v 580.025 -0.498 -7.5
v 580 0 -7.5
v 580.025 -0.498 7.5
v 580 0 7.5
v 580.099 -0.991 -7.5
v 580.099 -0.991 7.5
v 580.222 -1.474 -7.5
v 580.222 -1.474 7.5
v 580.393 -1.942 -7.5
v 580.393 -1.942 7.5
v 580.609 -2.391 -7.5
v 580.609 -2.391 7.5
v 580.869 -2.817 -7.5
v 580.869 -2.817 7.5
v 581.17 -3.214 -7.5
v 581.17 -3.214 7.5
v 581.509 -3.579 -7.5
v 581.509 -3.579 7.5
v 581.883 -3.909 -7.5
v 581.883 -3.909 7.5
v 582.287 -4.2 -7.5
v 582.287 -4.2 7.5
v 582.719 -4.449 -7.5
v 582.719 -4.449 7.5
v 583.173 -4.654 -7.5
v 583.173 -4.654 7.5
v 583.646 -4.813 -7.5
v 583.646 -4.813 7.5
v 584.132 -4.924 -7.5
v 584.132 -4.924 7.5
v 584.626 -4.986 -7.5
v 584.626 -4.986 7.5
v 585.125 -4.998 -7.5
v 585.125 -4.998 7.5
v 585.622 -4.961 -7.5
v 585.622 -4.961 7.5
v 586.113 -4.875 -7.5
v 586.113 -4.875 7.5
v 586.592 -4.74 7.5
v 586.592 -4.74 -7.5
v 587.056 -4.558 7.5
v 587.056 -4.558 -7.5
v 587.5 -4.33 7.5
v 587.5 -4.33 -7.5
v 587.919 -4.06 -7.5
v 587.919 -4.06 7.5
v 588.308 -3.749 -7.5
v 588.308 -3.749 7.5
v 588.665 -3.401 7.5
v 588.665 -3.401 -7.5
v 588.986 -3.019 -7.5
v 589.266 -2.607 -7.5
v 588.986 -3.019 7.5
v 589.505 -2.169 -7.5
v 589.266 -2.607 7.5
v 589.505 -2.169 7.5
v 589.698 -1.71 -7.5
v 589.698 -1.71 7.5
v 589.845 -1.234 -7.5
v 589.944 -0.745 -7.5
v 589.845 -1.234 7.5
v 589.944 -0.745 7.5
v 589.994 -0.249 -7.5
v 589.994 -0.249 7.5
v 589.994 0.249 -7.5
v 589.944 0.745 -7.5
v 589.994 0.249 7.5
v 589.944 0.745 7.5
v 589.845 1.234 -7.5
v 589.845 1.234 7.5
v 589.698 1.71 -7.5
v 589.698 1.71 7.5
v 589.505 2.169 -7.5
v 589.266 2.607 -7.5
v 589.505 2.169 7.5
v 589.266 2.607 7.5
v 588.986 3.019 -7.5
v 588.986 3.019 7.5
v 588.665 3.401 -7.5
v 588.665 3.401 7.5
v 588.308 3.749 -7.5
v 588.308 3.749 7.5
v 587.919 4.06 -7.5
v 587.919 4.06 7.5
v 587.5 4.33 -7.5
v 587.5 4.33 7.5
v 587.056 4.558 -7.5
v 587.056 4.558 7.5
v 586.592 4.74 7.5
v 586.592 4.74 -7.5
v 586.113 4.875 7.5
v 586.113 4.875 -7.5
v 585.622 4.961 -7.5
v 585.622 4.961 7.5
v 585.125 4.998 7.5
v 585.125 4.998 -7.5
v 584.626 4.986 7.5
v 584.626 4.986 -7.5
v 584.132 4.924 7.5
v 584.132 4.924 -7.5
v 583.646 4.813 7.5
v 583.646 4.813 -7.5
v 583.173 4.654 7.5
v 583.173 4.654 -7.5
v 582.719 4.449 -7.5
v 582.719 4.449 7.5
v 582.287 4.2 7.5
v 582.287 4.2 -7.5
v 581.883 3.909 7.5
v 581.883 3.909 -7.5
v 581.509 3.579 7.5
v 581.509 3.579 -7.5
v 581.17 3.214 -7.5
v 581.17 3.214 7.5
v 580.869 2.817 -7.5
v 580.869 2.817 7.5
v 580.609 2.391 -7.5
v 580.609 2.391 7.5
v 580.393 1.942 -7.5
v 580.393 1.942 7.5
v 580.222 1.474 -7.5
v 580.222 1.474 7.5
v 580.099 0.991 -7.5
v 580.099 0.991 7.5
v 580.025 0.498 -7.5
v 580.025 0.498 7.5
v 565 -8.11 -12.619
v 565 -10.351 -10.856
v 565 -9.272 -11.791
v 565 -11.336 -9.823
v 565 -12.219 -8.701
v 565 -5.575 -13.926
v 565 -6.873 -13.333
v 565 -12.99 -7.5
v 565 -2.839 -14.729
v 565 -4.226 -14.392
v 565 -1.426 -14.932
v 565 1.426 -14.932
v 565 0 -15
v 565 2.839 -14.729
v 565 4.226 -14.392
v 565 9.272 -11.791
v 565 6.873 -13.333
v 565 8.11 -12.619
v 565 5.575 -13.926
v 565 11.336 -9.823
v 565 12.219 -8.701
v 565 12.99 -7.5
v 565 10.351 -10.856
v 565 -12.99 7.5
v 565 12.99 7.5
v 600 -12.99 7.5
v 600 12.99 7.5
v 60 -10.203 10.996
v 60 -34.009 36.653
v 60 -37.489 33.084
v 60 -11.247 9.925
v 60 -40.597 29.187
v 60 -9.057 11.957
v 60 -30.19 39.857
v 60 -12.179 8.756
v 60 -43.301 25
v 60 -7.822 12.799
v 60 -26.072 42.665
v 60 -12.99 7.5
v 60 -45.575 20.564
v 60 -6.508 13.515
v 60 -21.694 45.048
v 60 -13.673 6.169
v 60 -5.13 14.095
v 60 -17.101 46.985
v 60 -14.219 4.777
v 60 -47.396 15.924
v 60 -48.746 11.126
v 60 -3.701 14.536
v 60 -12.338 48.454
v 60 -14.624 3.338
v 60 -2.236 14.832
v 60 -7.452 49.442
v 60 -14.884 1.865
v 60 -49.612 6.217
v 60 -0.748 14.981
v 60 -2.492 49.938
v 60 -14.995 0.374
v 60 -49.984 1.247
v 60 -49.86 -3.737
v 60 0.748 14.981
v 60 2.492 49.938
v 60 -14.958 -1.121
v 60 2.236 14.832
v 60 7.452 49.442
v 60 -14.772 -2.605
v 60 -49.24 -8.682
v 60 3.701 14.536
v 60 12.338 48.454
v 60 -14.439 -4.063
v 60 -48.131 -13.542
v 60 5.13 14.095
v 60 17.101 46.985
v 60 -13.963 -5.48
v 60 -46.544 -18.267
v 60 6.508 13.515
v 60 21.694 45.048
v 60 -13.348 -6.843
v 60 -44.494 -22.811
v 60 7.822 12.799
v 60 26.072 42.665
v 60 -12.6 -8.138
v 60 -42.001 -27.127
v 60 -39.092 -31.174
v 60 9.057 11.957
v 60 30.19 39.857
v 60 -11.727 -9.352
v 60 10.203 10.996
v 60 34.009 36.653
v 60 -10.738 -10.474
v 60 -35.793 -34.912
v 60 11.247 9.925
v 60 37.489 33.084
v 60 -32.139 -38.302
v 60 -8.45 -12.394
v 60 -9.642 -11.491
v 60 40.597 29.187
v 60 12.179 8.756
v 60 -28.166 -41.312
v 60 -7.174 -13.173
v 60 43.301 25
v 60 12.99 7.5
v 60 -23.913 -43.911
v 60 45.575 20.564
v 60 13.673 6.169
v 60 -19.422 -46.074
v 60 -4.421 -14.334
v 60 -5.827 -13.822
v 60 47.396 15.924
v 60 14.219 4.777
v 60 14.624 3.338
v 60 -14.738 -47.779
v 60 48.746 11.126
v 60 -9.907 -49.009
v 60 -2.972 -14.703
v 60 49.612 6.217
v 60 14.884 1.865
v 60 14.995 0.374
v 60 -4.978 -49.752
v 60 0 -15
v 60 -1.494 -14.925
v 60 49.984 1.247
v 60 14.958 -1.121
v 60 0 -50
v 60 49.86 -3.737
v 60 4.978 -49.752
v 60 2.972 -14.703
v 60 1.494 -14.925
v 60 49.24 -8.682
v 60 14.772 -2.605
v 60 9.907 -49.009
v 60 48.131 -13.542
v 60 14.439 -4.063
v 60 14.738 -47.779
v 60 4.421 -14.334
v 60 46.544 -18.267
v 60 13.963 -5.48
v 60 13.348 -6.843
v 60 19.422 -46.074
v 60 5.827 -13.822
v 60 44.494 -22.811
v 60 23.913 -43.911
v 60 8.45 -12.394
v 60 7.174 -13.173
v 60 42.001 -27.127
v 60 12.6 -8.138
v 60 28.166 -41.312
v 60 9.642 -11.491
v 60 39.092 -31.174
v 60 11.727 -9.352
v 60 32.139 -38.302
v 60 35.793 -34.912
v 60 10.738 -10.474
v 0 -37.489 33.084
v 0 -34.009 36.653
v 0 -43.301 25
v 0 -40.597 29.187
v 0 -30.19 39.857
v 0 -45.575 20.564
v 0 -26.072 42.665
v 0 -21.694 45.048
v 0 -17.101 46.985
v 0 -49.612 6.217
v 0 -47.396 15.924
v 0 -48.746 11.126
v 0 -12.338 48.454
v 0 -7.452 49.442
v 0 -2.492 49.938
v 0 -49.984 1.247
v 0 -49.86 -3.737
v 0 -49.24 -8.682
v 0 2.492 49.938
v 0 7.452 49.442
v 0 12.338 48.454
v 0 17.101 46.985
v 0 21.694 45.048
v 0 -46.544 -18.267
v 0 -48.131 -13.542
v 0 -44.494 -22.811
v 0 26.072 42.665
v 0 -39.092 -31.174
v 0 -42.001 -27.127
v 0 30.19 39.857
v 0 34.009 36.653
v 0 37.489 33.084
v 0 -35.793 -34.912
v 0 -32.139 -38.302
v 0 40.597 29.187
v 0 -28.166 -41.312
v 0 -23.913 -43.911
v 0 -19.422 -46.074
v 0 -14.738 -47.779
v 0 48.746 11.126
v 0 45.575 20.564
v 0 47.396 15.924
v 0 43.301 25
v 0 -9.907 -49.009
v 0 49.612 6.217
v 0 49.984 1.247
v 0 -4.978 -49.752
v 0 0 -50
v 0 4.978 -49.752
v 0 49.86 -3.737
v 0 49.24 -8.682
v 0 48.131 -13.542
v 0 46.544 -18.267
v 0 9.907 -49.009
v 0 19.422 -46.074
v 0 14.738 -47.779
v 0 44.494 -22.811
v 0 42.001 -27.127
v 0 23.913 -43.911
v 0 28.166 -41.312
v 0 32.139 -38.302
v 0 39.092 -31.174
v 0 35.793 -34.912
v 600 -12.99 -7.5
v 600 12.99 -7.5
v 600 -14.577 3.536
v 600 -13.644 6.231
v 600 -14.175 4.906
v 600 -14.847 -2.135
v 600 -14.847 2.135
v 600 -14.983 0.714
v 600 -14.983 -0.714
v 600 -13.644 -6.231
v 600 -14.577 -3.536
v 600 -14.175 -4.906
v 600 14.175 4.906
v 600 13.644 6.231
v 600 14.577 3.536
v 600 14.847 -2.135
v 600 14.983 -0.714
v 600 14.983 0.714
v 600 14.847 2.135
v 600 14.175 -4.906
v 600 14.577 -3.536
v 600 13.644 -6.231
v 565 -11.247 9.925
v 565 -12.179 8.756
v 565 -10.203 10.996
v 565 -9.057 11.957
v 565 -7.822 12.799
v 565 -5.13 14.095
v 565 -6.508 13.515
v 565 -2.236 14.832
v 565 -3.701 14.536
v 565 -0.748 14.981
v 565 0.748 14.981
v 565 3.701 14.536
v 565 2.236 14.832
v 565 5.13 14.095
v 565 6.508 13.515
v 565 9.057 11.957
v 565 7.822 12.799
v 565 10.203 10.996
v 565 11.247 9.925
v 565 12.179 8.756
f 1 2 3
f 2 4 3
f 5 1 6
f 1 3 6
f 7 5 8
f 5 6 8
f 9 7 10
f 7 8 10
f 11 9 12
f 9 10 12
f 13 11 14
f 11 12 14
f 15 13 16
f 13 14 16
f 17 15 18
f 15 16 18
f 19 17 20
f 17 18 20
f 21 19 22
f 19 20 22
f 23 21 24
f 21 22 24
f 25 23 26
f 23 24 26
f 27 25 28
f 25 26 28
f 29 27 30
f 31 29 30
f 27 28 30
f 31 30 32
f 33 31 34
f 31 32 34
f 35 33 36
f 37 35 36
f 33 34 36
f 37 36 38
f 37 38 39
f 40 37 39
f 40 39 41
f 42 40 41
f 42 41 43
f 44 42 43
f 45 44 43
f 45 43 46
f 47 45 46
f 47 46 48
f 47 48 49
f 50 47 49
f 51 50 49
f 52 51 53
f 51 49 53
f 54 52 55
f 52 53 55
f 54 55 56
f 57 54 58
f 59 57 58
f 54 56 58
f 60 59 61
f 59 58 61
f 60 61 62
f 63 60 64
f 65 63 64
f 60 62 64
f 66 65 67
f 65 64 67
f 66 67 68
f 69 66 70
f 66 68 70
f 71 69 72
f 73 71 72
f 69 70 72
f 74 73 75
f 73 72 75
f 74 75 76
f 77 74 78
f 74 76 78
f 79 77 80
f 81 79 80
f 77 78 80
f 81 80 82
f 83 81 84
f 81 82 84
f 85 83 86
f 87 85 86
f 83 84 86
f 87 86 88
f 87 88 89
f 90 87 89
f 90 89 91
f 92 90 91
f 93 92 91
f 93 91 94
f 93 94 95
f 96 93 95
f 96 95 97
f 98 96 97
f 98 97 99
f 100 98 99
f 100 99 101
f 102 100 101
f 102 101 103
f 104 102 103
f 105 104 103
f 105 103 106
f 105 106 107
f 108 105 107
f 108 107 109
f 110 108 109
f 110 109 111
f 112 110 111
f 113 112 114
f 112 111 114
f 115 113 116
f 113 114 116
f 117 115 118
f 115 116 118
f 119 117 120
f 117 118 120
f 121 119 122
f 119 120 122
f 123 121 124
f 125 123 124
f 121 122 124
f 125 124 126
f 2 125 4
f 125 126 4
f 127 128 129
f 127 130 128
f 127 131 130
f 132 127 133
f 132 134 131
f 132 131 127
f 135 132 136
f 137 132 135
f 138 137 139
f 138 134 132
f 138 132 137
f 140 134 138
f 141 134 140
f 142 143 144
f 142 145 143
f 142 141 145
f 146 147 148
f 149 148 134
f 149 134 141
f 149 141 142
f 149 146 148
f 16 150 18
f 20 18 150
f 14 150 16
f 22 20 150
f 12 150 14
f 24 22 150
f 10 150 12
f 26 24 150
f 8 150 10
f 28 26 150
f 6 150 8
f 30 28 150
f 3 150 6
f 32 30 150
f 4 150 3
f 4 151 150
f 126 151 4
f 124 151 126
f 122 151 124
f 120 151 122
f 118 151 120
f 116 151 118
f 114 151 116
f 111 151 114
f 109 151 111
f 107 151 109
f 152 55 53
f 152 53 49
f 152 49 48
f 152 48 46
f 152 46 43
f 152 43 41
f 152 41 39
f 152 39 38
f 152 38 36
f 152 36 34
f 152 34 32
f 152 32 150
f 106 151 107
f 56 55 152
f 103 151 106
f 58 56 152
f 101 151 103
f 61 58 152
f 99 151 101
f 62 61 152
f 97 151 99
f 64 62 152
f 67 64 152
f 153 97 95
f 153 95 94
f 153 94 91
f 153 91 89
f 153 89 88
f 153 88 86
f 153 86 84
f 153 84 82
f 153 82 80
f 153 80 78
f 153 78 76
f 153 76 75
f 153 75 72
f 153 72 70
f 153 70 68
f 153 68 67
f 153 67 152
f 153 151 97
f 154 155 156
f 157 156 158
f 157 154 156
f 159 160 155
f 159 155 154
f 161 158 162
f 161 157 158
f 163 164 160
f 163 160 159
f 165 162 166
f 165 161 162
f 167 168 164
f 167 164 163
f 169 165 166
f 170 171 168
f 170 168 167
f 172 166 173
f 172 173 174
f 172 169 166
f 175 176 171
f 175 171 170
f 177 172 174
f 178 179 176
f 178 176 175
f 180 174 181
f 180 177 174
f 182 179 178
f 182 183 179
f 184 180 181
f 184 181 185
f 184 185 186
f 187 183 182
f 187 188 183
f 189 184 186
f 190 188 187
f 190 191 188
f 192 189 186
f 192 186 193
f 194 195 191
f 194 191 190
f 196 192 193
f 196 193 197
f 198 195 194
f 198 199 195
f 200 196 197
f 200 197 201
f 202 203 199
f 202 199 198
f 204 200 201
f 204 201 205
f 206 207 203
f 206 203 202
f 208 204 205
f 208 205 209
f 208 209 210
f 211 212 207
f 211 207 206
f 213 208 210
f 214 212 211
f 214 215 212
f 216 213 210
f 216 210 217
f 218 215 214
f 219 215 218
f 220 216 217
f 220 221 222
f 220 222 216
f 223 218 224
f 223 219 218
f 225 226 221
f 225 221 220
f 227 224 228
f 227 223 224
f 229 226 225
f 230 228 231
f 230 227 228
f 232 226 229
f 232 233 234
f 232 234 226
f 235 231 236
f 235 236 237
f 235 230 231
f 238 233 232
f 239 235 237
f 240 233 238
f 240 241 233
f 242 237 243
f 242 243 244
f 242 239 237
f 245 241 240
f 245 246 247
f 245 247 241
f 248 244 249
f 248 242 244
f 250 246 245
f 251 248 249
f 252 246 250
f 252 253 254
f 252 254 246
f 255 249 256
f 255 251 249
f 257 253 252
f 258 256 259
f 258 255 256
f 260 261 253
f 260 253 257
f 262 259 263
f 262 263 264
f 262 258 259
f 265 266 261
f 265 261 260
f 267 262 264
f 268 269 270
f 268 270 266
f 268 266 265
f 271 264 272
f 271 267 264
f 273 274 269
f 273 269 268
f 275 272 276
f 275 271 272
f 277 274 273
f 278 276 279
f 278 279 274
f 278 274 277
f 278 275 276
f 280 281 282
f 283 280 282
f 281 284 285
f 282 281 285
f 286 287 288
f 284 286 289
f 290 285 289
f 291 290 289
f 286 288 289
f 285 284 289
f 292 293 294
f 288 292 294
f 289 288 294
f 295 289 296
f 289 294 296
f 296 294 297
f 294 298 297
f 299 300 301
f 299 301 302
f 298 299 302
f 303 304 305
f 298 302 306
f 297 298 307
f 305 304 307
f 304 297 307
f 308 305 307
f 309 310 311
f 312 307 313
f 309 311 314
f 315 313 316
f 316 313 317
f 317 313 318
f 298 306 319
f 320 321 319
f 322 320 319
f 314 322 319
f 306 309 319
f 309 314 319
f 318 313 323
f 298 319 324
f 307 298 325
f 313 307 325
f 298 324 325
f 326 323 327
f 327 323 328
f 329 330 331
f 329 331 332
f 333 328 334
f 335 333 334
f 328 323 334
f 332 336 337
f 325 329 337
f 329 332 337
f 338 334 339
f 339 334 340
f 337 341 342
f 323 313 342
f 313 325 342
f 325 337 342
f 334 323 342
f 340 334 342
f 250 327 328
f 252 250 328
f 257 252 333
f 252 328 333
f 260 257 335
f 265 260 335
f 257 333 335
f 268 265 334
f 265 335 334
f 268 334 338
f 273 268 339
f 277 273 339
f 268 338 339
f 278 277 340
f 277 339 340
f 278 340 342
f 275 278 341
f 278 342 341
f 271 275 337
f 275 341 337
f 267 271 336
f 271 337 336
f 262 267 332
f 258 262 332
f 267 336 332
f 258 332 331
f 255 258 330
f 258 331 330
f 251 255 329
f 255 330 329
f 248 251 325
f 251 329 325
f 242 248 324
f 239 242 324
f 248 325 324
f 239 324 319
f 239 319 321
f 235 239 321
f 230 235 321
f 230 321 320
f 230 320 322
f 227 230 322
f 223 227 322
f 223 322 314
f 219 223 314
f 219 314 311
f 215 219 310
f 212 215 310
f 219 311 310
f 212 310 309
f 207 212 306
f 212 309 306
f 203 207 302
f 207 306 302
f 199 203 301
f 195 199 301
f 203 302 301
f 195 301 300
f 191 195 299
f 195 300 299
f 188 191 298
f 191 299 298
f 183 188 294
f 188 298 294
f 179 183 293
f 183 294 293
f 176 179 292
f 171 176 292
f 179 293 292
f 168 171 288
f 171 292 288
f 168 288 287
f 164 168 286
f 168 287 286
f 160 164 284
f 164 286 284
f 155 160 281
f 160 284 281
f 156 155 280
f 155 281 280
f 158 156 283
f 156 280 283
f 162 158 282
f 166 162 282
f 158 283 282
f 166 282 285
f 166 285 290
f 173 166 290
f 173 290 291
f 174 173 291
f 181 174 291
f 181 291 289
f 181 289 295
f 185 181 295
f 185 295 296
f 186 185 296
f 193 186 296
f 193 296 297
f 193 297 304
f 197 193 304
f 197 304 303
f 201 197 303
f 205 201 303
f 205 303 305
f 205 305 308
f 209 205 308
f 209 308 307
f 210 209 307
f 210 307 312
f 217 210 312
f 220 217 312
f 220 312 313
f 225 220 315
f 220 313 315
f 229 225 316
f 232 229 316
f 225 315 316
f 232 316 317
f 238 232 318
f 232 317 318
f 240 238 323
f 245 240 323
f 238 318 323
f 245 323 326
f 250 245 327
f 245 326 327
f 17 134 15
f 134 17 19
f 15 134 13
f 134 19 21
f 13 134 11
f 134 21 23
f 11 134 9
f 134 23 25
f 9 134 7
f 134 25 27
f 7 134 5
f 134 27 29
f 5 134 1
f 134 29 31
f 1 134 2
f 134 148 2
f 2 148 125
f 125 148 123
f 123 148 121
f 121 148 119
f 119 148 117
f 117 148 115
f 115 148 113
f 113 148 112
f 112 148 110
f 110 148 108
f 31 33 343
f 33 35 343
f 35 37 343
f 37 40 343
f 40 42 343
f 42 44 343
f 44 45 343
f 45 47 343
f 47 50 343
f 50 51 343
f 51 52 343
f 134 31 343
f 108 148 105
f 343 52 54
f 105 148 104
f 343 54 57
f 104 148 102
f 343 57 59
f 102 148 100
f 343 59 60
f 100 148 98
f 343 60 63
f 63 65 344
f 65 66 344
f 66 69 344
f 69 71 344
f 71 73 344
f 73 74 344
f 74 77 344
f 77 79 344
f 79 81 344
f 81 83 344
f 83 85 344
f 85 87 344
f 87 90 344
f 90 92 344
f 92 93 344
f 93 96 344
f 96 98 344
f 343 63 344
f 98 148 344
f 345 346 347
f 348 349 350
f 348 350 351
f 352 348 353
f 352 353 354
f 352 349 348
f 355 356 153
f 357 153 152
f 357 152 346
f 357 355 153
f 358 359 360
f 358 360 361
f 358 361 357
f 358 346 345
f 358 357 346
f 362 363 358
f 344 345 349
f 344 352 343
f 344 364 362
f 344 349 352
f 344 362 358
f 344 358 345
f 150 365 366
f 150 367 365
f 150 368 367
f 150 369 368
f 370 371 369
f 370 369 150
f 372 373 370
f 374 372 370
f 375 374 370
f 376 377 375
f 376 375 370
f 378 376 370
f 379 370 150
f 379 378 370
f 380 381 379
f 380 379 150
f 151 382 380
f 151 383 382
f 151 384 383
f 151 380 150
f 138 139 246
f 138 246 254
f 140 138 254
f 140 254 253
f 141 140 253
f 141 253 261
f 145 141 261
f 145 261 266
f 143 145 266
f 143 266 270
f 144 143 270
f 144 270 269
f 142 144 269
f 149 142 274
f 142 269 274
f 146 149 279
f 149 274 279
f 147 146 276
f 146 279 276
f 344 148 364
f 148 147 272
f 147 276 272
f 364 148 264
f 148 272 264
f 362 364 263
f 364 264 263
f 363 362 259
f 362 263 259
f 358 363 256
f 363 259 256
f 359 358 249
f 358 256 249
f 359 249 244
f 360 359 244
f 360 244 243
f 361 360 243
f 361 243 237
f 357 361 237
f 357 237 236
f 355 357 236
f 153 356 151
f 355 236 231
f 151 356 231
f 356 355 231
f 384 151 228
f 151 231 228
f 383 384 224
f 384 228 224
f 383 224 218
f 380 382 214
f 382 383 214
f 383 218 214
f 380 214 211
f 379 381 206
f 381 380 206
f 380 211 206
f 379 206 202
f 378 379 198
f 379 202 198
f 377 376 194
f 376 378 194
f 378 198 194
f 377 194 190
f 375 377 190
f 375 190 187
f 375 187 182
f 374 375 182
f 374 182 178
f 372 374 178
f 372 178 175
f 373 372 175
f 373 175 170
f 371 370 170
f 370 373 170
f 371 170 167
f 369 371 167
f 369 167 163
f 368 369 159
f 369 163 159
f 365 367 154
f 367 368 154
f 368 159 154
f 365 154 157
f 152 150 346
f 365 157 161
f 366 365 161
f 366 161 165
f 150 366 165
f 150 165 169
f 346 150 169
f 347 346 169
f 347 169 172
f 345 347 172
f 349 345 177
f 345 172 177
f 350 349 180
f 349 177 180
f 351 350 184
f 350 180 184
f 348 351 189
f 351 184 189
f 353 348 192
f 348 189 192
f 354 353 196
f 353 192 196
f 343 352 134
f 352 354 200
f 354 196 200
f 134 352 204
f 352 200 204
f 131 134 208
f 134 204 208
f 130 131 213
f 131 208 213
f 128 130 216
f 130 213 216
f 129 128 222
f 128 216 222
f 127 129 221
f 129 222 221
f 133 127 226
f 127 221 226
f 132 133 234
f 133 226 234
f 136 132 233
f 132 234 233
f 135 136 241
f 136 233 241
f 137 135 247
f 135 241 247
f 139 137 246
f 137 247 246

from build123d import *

# Parameters (mm, degrees)
SKETCH1_R                           = 50
SKETCH1_R_2                         = 15
BOSS_EXTRUDE2_DEPTH                 = 60
SKETCH1_3_R                         = 15
BOSS_EXTRUDE3_DEPTH                 = 600
CUT_EXTRUDE1_REACH                  = 606.152
CUT_EXTRUDE1_END_RADIUS             = 15
SKETCH2_W                           = 35
SKETCH2_H                           = 7.5
CUT_EXTRUDE1_DIRECTION_2_REACH      = 606.152
CUT_EXTRUDE1_DIRECTION_2_END_RADIUS = 15
CUT_EXTRUDE2_REACH                  = 606.152
SKETCH3_R                           = 5
CUT_EXTRUDE2_DIRECTION_2_REACH      = 606.152


with BuildPart() as part:
    # Sketch1 → Boss-Extrude2 (new body)
    # profile 1 of 2: a face of its own
    with BuildSketch(Plane(origin=(0, 0, 0), x_dir=(0, 0, -1), z_dir=(1, 0, 0))):
        Circle(SKETCH1_R)
        Circle(SKETCH1_R_2, mode=Mode.SUBTRACT)
    # profile 2 of 2: a face of its own
    with BuildSketch(Plane(origin=(0, 0, 0), x_dir=(0, 0, -1), z_dir=(1, 0, 0))):
        Circle(SKETCH1_R_2)
    extrude(amount=BOSS_EXTRUDE2_DEPTH)

    # Sketch1<3> → Boss-Extrude3 (add)
    with BuildSketch(Plane(origin=(0, 0, 0), x_dir=(0, 0, -1), z_dir=(1, 0, 0))):
        Circle(SKETCH1_3_R)
    extrude(amount=BOSS_EXTRUDE3_DEPTH)

    # Cut-Extrude1: up to this cylinder (the profile starts inside it)
    cut_extrude1_end = Plane(origin=(582.5, 0, 0), z_dir=(-1, 0, 0)) * Cylinder(CUT_EXTRUDE1_END_RADIUS, 1243.304, mode=Mode.PRIVATE)
    # Sketch2 → Cut-Extrude1 (cut, up to the surface)
    with BuildSketch(Plane(origin=(0, 0, 0), x_dir=(1, 0, 0), z_dir=(0, 1, 0)), mode=Mode.PRIVATE) as cut_extrude1_sk1:
        with Locations((582.5, 11.25)):
            Rectangle(SKETCH2_W, SKETCH2_H)
    cut_extrude1_tool1 = extrude(cut_extrude1_sk1.sketch, amount=-CUT_EXTRUDE1_REACH, mode=Mode.PRIVATE) & cut_extrude1_end
    add(cut_extrude1_tool1.solids().sort_by_distance((582.5, 0, -11.25))[0], mode=Mode.SUBTRACT)
    # Sketch2 → Cut-Extrude1 (cut, up to the surface)
    with BuildSketch(Plane(origin=(0, 0, 0), x_dir=(1, 0, 0), z_dir=(0, 1, 0)), mode=Mode.PRIVATE) as cut_extrude1_sk2:
        with Locations((582.5, -11.25)):
            Rectangle(SKETCH2_W, SKETCH2_H)
    cut_extrude1_tool2 = extrude(cut_extrude1_sk2.sketch, amount=-CUT_EXTRUDE1_REACH, mode=Mode.PRIVATE) & cut_extrude1_end
    add(cut_extrude1_tool2.solids().sort_by_distance((582.5, 0, 11.25))[0], mode=Mode.SUBTRACT)

    # Cut-Extrude1 direction 2: up to this cylinder (the profile starts inside it)
    cut_extrude1_direction_2_end = Plane(origin=(582.5, 0, 0), z_dir=(-1, 0, 0)) * Cylinder(CUT_EXTRUDE1_DIRECTION_2_END_RADIUS, 1243.304, mode=Mode.PRIVATE)
    # Sketch2 → Cut-Extrude1 direction 2 (cut, up to the surface)
    with BuildSketch(Plane(origin=(0, 0, 0), x_dir=(1, 0, 0), z_dir=(0, 1, 0)), mode=Mode.PRIVATE) as cut_extrude1_direction_2_sk1:
        with Locations((582.5, 11.25)):
            Rectangle(SKETCH2_W, SKETCH2_H)
    cut_extrude1_direction_2_tool1 = extrude(cut_extrude1_direction_2_sk1.sketch, amount=CUT_EXTRUDE1_DIRECTION_2_REACH, mode=Mode.PRIVATE) & cut_extrude1_direction_2_end
    add(cut_extrude1_direction_2_tool1.solids().sort_by_distance((582.5, 0, -11.25))[0], mode=Mode.SUBTRACT)
    # Sketch2 → Cut-Extrude1 direction 2 (cut, up to the surface)
    with BuildSketch(Plane(origin=(0, 0, 0), x_dir=(1, 0, 0), z_dir=(0, 1, 0)), mode=Mode.PRIVATE) as cut_extrude1_direction_2_sk2:
        with Locations((582.5, -11.25)):
            Rectangle(SKETCH2_W, SKETCH2_H)
    cut_extrude1_direction_2_tool2 = extrude(cut_extrude1_direction_2_sk2.sketch, amount=CUT_EXTRUDE1_DIRECTION_2_REACH, mode=Mode.PRIVATE) & cut_extrude1_direction_2_end
    add(cut_extrude1_direction_2_tool2.solids().sort_by_distance((582.5, 0, 11.25))[0], mode=Mode.SUBTRACT)

    # Sketch3 → Cut-Extrude2 (cut, up to next)
    with BuildSketch(Plane.XY, mode=Mode.PRIVATE) as cut_extrude2_sk1:
        with Locations(Location((585, 0, 0), (0, 0, 180))):
            Circle(SKETCH3_R)
    cut_extrude2_tool1 = extrude(cut_extrude2_sk1.sketch, amount=-CUT_EXTRUDE2_REACH, mode=Mode.PRIVATE) & part.part
    add(cut_extrude2_tool1.solids().sort_by_distance((585, 0, 0))[0], mode=Mode.SUBTRACT)

    # Sketch3 → Cut-Extrude2 direction 2 (cut, up to next)
    with BuildSketch(Plane.XY, mode=Mode.PRIVATE) as cut_extrude2_direction_2_sk1:
        with Locations(Location((585, 0, 0), (0, 0, 180))):
            Circle(SKETCH3_R)
    cut_extrude2_direction_2_tool1 = extrude(cut_extrude2_direction_2_sk1.sketch, amount=CUT_EXTRUDE2_DIRECTION_2_REACH, mode=Mode.PRIVATE) & part.part
    add(cut_extrude2_direction_2_tool1.solids().sort_by_distance((585, 0, 0))[0], mode=Mode.SUBTRACT)


solid = part.part
